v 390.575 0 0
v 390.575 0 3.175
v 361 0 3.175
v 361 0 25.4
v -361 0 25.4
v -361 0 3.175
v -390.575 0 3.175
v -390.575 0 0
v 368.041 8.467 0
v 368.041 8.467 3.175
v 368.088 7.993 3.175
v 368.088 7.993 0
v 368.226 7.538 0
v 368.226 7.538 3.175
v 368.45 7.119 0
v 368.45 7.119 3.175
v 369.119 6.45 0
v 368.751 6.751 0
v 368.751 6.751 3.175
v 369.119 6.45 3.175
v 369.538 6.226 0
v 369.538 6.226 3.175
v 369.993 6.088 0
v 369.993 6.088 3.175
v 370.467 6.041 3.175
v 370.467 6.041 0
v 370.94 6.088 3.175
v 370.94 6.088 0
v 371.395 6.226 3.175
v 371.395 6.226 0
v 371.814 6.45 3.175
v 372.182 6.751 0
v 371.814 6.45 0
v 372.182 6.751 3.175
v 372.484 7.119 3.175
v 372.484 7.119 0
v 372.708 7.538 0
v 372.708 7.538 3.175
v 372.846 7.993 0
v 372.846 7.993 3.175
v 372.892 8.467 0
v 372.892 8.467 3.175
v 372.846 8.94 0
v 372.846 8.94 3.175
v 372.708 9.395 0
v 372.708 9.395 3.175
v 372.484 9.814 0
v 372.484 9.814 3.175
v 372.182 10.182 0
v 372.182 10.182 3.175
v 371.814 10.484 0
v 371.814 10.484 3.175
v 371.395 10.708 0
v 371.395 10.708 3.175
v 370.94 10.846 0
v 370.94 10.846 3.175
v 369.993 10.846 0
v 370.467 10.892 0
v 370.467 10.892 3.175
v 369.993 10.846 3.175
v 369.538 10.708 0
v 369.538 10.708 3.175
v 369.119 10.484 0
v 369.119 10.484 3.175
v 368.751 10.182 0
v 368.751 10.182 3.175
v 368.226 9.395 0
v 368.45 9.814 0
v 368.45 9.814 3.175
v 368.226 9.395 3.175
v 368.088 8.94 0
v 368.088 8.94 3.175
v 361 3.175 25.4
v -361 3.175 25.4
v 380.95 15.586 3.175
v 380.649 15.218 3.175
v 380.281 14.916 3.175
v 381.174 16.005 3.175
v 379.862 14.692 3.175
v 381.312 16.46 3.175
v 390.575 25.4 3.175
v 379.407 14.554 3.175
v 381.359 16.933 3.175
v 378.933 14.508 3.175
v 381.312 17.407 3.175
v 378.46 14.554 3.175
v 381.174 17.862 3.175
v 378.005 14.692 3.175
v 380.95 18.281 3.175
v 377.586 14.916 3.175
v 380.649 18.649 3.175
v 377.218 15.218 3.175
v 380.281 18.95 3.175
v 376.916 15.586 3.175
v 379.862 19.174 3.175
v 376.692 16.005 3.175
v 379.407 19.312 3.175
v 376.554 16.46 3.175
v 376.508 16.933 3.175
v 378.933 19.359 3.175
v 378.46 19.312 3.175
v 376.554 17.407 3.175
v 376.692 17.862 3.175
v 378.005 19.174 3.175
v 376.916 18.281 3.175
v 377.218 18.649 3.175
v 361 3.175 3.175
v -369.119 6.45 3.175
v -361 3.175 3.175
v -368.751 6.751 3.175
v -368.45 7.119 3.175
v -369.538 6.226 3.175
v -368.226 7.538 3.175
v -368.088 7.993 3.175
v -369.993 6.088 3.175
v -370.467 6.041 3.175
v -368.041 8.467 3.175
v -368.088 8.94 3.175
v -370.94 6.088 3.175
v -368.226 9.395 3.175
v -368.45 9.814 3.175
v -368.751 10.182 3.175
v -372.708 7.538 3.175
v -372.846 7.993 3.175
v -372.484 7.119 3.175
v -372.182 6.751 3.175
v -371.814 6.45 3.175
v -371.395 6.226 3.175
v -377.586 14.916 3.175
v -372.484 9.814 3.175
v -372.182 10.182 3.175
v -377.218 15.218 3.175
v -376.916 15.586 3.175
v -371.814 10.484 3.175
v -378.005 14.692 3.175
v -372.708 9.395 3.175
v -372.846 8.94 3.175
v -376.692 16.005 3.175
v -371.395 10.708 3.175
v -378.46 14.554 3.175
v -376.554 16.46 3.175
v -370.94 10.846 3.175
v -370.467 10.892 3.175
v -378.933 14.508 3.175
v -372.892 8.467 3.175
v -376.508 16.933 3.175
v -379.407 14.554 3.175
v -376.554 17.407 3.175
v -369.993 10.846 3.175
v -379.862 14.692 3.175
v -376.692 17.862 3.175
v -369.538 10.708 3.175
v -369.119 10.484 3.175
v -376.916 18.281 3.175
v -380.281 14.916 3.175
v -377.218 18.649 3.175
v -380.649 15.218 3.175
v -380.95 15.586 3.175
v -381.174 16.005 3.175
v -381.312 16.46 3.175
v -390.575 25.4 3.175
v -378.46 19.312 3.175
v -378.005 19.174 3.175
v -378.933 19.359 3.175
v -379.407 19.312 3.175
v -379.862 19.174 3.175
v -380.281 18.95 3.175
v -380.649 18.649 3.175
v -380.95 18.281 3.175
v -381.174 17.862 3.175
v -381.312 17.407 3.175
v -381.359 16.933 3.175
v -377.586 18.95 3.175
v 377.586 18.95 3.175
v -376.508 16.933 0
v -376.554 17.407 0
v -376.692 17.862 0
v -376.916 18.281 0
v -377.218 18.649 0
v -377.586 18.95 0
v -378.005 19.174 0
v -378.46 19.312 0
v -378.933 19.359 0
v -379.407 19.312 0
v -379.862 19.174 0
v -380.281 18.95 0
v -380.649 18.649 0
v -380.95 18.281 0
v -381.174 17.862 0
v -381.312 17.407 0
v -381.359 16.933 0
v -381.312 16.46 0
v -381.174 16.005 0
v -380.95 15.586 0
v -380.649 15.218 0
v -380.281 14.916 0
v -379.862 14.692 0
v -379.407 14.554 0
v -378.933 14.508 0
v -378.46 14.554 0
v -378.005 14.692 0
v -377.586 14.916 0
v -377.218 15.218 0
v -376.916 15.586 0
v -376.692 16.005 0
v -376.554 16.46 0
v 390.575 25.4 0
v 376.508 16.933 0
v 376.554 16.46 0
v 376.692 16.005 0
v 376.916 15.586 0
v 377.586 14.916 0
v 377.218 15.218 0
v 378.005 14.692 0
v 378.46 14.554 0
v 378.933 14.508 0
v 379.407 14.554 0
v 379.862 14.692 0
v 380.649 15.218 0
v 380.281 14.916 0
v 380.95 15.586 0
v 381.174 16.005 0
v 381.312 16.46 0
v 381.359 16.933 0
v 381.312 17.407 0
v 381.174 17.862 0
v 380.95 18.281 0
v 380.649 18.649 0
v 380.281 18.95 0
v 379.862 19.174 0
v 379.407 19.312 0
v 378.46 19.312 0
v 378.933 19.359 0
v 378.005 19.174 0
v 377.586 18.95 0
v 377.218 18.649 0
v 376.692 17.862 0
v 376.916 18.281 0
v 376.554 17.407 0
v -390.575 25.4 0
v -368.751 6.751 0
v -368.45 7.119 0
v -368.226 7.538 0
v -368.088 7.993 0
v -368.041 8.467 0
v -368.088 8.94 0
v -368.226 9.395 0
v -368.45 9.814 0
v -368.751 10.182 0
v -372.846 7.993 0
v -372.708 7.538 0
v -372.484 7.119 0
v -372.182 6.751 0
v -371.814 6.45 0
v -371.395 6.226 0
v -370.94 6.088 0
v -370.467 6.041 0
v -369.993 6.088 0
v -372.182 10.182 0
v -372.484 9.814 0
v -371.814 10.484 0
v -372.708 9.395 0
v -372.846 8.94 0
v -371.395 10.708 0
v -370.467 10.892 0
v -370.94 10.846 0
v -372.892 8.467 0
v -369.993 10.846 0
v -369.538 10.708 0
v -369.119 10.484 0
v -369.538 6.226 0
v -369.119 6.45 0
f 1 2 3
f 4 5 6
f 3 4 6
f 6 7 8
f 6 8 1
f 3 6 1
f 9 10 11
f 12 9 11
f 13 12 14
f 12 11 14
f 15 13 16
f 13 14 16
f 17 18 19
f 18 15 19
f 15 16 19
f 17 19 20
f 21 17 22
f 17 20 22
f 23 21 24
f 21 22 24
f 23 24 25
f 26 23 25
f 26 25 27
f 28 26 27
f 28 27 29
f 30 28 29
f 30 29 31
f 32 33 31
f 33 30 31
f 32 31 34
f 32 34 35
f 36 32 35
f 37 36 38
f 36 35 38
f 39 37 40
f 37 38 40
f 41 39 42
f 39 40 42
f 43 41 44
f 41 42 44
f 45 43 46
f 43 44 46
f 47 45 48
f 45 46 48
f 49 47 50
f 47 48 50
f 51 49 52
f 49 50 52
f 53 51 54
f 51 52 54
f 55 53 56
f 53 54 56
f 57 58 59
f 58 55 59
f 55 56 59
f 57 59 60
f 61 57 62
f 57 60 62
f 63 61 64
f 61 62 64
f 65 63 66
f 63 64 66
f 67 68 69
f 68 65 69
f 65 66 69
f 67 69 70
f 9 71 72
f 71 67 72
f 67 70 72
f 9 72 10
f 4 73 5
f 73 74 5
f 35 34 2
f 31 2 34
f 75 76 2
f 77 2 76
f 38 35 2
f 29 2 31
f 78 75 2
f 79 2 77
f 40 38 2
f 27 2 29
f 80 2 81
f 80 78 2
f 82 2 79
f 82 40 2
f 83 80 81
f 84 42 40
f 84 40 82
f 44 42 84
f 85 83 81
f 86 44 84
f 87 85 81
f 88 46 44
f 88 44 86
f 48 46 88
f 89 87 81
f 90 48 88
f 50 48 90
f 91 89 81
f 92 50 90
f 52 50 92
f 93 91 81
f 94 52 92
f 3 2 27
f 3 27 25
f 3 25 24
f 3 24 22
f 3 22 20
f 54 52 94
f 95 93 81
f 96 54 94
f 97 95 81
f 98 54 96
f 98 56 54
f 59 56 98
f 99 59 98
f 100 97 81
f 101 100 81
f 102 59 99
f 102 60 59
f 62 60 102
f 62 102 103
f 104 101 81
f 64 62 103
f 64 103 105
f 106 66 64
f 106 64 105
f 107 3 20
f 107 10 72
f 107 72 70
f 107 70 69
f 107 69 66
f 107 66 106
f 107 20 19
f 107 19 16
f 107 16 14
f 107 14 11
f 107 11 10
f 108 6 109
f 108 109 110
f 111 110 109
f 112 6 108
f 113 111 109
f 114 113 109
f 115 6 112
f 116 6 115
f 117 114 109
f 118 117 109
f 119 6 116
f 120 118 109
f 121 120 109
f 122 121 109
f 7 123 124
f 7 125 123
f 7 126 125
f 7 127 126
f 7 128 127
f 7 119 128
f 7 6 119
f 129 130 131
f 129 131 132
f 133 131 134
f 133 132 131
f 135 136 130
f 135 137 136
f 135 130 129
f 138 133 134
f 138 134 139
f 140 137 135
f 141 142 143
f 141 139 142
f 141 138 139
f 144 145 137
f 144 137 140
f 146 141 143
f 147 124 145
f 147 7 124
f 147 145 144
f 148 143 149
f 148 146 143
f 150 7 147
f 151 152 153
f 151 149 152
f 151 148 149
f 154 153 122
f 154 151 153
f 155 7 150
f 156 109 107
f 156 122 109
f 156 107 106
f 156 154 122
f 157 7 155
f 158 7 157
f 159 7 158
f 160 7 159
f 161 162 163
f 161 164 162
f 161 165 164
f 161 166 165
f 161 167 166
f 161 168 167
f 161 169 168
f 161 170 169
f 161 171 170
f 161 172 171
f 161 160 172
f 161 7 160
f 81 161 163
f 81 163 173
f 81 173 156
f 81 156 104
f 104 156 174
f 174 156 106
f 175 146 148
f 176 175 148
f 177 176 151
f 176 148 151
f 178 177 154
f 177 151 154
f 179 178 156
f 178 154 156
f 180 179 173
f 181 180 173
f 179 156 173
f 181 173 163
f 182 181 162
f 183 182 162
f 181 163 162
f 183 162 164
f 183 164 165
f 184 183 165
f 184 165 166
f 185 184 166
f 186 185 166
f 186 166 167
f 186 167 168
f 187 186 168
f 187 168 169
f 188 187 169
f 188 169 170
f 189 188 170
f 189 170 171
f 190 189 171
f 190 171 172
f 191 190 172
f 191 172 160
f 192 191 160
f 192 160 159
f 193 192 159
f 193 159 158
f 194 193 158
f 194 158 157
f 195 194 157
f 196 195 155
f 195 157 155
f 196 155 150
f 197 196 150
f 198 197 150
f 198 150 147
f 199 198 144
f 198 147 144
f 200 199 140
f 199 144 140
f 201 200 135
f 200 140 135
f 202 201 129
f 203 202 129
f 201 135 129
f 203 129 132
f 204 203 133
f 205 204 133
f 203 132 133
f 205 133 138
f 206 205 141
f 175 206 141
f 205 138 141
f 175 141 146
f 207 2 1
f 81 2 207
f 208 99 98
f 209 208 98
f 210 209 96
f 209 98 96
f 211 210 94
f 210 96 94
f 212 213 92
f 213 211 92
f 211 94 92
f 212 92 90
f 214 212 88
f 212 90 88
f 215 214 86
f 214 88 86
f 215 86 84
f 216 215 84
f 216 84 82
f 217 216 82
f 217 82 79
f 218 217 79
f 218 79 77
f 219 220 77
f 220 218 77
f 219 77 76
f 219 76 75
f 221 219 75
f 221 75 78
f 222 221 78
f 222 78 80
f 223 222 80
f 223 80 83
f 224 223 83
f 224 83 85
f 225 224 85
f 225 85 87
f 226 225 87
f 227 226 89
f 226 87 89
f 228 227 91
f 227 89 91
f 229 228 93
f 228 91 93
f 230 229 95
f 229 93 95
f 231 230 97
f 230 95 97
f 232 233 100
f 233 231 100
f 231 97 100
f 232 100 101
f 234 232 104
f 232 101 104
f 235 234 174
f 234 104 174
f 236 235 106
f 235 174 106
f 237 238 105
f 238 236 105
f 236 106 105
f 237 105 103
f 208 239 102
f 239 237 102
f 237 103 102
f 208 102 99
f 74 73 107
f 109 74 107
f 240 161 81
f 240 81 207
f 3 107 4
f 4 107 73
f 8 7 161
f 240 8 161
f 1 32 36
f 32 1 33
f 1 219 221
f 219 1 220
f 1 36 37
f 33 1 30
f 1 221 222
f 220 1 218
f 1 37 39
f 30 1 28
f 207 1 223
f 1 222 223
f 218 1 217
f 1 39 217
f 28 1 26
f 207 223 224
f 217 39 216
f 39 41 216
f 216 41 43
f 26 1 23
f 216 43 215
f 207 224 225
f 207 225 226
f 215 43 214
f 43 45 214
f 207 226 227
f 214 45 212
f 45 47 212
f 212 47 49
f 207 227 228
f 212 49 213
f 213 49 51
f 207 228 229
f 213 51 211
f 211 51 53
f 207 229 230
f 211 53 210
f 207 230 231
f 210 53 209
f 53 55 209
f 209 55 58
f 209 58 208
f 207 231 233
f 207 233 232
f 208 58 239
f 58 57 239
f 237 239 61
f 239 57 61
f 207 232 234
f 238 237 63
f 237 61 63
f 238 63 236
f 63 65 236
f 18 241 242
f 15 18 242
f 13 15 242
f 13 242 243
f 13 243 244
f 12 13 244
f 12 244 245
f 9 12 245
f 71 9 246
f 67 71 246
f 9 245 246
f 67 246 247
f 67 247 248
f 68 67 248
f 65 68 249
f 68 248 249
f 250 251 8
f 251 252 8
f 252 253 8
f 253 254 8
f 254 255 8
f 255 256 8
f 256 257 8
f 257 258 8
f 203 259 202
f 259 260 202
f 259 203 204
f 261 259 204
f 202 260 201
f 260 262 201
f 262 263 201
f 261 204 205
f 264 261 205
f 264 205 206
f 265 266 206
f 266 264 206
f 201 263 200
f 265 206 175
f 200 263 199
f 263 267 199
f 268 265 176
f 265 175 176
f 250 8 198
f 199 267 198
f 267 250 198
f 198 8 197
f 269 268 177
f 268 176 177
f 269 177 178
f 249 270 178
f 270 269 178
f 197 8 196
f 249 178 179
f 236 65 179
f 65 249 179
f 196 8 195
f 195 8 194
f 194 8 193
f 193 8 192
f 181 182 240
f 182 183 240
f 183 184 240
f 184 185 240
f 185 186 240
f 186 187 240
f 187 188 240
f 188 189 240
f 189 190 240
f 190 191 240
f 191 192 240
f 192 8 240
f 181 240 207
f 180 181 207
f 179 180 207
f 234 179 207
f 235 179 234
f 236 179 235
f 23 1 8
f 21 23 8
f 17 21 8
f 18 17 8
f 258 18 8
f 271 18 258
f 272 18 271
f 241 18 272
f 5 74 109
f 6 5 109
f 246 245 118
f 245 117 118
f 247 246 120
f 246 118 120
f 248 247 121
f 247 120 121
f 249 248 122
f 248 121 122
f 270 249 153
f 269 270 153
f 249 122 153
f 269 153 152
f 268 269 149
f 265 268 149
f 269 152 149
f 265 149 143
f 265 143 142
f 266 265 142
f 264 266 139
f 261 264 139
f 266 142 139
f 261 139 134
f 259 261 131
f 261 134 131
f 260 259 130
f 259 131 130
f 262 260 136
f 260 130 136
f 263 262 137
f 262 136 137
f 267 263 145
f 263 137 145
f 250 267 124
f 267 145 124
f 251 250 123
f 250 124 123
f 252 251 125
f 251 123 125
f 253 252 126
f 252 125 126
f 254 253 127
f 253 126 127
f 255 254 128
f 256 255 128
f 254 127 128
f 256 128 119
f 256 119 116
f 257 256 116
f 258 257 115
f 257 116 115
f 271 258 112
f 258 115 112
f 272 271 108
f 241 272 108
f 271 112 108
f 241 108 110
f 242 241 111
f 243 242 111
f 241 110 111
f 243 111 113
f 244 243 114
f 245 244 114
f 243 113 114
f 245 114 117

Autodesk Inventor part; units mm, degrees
ref_plane "YZ Plane" through (0, 0, 0) normal (1, 0, 0) x (0, 1, 0)
ref_plane "XZ Plane" through (0, 0, 0) normal (0, 1, 0) x (-1, 0, 0)
ref_plane "XY Plane" through (0, 0, 0) normal (0, 0, 1) x (1, 0, 0)
sketch "Sketch1" plane through (0, 0, 0) normal (1, 0, 0) x (0, 1, 0)
  line L0 (25.4, 25.4) -> (0, 25.4) construction
  line L1 (0, 25.4) -> (0, 0)
  line L2 (0, 0) -> (25.4, 0)
  line L3 (25.4, 0) -> (25.4, 25.4) construction
  line L4 (25.4, 25.4) -> (3.175, 25.4) construction
  line L5 (3.175, 25.4) -> (3.175, 3.175)
  line L6 (3.175, 3.175) -> (25.4, 3.175)
  line L7 (25.4, 3.175) -> (25.4, 25.4) construction
  line L8 (25.4, 3.175) -> (25.4, 0)
  line L9 (3.175, 25.4) -> (0, 25.4)
  point P0 (0, 0)
  dimension "d1" = 25.4
  dimension "d2" = 3.175
extrude "Extrusion1" add sketch "Sketch1" along normal mid plane 781.15
sketch "Sketch2" plane through (-390.575, 3.175, 25.4) normal (0, 1, 0) x (1, 0, 0)
  line L0 (0, 0) -> (781.15, 0) projected
  line L1 (0, 0) -> (29.575, 0)
  line L2 (29.575, 0) -> (29.575, 22.225)
  line L3 (29.575, 22.225) -> (0, 22.225)
  line L4 (0, 22.225) -> (0, 0)
  line L5 (0, 22.225) -> (781.15, 22.225) projected
  point P0 (390.575, 25.4)
  point P1 (29.575, 0)
  dimension "d5" = 29.575
extrude "Extrusion2" cut sketch "Sketch2" against normal blind 3.175
sketch "Sketch3" plane through (-390.575, 25.4, 3.175) normal (0, 0, 1) x (1, 0, 0)
  line L0 (0, 0) -> (781.15, 0) construction
  line L1 (3.175, 0) -> (28.575, 0) construction
  line L2 (28.575, 0) -> (28.575, -25.4) construction
  line L3 (28.575, -25.4) -> (3.175, -25.4) construction
  line L4 (3.175, -25.4) -> (3.175, 0) construction
  line L5 (0, -25.4) -> (0, 0) construction
  line L6 (11.6417, -8.4667) -> (20.1083, -8.4667) construction
  line L7 (20.1083, -8.4667) -> (20.1083, -16.9333) construction
  line L8 (20.1083, -16.9333) -> (11.6417, -16.9333) construction
  line L9 (11.6417, -16.9333) -> (11.6417, -8.4667) construction
  circle A0 centre (11.6417, -8.4667) radius 2.4257
  circle A1 centre (20.1083, -16.9333) radius 2.4257
  point P0 (390.575, -25.4)
  point P1 (15.875, -8.4667)
  point P2 (15.875, 0)
  point P3 (20.1083, -12.7)
  point P4 (28.575, -12.7)
  dimension "d14" = 3.175
  dimension "d15" = 25.4
  dimension "d16" = 8.4667
  dimension "d17" = 4.8514
extrude "Extrusion4" cut sketch "Sketch3" against normal blind 3.175
mirror "Mirror2" about plane through (0, 0, 0) normal (1, 0, 0) of "Extrusion4", "Extrusion2"
equation "\"d3\" = beamXW"
equation "\"d17\" = rivetHoleD"
equation "\"shelfMargin\" = 1"
equation "\"beamXW\" = 781.15"
equation "\"s_t\" = 3.175"
equation "\"rivetD\" = 4.7625"
equation "\"rivetHoleD\" = 4.8514"
properties part number "beamX"
